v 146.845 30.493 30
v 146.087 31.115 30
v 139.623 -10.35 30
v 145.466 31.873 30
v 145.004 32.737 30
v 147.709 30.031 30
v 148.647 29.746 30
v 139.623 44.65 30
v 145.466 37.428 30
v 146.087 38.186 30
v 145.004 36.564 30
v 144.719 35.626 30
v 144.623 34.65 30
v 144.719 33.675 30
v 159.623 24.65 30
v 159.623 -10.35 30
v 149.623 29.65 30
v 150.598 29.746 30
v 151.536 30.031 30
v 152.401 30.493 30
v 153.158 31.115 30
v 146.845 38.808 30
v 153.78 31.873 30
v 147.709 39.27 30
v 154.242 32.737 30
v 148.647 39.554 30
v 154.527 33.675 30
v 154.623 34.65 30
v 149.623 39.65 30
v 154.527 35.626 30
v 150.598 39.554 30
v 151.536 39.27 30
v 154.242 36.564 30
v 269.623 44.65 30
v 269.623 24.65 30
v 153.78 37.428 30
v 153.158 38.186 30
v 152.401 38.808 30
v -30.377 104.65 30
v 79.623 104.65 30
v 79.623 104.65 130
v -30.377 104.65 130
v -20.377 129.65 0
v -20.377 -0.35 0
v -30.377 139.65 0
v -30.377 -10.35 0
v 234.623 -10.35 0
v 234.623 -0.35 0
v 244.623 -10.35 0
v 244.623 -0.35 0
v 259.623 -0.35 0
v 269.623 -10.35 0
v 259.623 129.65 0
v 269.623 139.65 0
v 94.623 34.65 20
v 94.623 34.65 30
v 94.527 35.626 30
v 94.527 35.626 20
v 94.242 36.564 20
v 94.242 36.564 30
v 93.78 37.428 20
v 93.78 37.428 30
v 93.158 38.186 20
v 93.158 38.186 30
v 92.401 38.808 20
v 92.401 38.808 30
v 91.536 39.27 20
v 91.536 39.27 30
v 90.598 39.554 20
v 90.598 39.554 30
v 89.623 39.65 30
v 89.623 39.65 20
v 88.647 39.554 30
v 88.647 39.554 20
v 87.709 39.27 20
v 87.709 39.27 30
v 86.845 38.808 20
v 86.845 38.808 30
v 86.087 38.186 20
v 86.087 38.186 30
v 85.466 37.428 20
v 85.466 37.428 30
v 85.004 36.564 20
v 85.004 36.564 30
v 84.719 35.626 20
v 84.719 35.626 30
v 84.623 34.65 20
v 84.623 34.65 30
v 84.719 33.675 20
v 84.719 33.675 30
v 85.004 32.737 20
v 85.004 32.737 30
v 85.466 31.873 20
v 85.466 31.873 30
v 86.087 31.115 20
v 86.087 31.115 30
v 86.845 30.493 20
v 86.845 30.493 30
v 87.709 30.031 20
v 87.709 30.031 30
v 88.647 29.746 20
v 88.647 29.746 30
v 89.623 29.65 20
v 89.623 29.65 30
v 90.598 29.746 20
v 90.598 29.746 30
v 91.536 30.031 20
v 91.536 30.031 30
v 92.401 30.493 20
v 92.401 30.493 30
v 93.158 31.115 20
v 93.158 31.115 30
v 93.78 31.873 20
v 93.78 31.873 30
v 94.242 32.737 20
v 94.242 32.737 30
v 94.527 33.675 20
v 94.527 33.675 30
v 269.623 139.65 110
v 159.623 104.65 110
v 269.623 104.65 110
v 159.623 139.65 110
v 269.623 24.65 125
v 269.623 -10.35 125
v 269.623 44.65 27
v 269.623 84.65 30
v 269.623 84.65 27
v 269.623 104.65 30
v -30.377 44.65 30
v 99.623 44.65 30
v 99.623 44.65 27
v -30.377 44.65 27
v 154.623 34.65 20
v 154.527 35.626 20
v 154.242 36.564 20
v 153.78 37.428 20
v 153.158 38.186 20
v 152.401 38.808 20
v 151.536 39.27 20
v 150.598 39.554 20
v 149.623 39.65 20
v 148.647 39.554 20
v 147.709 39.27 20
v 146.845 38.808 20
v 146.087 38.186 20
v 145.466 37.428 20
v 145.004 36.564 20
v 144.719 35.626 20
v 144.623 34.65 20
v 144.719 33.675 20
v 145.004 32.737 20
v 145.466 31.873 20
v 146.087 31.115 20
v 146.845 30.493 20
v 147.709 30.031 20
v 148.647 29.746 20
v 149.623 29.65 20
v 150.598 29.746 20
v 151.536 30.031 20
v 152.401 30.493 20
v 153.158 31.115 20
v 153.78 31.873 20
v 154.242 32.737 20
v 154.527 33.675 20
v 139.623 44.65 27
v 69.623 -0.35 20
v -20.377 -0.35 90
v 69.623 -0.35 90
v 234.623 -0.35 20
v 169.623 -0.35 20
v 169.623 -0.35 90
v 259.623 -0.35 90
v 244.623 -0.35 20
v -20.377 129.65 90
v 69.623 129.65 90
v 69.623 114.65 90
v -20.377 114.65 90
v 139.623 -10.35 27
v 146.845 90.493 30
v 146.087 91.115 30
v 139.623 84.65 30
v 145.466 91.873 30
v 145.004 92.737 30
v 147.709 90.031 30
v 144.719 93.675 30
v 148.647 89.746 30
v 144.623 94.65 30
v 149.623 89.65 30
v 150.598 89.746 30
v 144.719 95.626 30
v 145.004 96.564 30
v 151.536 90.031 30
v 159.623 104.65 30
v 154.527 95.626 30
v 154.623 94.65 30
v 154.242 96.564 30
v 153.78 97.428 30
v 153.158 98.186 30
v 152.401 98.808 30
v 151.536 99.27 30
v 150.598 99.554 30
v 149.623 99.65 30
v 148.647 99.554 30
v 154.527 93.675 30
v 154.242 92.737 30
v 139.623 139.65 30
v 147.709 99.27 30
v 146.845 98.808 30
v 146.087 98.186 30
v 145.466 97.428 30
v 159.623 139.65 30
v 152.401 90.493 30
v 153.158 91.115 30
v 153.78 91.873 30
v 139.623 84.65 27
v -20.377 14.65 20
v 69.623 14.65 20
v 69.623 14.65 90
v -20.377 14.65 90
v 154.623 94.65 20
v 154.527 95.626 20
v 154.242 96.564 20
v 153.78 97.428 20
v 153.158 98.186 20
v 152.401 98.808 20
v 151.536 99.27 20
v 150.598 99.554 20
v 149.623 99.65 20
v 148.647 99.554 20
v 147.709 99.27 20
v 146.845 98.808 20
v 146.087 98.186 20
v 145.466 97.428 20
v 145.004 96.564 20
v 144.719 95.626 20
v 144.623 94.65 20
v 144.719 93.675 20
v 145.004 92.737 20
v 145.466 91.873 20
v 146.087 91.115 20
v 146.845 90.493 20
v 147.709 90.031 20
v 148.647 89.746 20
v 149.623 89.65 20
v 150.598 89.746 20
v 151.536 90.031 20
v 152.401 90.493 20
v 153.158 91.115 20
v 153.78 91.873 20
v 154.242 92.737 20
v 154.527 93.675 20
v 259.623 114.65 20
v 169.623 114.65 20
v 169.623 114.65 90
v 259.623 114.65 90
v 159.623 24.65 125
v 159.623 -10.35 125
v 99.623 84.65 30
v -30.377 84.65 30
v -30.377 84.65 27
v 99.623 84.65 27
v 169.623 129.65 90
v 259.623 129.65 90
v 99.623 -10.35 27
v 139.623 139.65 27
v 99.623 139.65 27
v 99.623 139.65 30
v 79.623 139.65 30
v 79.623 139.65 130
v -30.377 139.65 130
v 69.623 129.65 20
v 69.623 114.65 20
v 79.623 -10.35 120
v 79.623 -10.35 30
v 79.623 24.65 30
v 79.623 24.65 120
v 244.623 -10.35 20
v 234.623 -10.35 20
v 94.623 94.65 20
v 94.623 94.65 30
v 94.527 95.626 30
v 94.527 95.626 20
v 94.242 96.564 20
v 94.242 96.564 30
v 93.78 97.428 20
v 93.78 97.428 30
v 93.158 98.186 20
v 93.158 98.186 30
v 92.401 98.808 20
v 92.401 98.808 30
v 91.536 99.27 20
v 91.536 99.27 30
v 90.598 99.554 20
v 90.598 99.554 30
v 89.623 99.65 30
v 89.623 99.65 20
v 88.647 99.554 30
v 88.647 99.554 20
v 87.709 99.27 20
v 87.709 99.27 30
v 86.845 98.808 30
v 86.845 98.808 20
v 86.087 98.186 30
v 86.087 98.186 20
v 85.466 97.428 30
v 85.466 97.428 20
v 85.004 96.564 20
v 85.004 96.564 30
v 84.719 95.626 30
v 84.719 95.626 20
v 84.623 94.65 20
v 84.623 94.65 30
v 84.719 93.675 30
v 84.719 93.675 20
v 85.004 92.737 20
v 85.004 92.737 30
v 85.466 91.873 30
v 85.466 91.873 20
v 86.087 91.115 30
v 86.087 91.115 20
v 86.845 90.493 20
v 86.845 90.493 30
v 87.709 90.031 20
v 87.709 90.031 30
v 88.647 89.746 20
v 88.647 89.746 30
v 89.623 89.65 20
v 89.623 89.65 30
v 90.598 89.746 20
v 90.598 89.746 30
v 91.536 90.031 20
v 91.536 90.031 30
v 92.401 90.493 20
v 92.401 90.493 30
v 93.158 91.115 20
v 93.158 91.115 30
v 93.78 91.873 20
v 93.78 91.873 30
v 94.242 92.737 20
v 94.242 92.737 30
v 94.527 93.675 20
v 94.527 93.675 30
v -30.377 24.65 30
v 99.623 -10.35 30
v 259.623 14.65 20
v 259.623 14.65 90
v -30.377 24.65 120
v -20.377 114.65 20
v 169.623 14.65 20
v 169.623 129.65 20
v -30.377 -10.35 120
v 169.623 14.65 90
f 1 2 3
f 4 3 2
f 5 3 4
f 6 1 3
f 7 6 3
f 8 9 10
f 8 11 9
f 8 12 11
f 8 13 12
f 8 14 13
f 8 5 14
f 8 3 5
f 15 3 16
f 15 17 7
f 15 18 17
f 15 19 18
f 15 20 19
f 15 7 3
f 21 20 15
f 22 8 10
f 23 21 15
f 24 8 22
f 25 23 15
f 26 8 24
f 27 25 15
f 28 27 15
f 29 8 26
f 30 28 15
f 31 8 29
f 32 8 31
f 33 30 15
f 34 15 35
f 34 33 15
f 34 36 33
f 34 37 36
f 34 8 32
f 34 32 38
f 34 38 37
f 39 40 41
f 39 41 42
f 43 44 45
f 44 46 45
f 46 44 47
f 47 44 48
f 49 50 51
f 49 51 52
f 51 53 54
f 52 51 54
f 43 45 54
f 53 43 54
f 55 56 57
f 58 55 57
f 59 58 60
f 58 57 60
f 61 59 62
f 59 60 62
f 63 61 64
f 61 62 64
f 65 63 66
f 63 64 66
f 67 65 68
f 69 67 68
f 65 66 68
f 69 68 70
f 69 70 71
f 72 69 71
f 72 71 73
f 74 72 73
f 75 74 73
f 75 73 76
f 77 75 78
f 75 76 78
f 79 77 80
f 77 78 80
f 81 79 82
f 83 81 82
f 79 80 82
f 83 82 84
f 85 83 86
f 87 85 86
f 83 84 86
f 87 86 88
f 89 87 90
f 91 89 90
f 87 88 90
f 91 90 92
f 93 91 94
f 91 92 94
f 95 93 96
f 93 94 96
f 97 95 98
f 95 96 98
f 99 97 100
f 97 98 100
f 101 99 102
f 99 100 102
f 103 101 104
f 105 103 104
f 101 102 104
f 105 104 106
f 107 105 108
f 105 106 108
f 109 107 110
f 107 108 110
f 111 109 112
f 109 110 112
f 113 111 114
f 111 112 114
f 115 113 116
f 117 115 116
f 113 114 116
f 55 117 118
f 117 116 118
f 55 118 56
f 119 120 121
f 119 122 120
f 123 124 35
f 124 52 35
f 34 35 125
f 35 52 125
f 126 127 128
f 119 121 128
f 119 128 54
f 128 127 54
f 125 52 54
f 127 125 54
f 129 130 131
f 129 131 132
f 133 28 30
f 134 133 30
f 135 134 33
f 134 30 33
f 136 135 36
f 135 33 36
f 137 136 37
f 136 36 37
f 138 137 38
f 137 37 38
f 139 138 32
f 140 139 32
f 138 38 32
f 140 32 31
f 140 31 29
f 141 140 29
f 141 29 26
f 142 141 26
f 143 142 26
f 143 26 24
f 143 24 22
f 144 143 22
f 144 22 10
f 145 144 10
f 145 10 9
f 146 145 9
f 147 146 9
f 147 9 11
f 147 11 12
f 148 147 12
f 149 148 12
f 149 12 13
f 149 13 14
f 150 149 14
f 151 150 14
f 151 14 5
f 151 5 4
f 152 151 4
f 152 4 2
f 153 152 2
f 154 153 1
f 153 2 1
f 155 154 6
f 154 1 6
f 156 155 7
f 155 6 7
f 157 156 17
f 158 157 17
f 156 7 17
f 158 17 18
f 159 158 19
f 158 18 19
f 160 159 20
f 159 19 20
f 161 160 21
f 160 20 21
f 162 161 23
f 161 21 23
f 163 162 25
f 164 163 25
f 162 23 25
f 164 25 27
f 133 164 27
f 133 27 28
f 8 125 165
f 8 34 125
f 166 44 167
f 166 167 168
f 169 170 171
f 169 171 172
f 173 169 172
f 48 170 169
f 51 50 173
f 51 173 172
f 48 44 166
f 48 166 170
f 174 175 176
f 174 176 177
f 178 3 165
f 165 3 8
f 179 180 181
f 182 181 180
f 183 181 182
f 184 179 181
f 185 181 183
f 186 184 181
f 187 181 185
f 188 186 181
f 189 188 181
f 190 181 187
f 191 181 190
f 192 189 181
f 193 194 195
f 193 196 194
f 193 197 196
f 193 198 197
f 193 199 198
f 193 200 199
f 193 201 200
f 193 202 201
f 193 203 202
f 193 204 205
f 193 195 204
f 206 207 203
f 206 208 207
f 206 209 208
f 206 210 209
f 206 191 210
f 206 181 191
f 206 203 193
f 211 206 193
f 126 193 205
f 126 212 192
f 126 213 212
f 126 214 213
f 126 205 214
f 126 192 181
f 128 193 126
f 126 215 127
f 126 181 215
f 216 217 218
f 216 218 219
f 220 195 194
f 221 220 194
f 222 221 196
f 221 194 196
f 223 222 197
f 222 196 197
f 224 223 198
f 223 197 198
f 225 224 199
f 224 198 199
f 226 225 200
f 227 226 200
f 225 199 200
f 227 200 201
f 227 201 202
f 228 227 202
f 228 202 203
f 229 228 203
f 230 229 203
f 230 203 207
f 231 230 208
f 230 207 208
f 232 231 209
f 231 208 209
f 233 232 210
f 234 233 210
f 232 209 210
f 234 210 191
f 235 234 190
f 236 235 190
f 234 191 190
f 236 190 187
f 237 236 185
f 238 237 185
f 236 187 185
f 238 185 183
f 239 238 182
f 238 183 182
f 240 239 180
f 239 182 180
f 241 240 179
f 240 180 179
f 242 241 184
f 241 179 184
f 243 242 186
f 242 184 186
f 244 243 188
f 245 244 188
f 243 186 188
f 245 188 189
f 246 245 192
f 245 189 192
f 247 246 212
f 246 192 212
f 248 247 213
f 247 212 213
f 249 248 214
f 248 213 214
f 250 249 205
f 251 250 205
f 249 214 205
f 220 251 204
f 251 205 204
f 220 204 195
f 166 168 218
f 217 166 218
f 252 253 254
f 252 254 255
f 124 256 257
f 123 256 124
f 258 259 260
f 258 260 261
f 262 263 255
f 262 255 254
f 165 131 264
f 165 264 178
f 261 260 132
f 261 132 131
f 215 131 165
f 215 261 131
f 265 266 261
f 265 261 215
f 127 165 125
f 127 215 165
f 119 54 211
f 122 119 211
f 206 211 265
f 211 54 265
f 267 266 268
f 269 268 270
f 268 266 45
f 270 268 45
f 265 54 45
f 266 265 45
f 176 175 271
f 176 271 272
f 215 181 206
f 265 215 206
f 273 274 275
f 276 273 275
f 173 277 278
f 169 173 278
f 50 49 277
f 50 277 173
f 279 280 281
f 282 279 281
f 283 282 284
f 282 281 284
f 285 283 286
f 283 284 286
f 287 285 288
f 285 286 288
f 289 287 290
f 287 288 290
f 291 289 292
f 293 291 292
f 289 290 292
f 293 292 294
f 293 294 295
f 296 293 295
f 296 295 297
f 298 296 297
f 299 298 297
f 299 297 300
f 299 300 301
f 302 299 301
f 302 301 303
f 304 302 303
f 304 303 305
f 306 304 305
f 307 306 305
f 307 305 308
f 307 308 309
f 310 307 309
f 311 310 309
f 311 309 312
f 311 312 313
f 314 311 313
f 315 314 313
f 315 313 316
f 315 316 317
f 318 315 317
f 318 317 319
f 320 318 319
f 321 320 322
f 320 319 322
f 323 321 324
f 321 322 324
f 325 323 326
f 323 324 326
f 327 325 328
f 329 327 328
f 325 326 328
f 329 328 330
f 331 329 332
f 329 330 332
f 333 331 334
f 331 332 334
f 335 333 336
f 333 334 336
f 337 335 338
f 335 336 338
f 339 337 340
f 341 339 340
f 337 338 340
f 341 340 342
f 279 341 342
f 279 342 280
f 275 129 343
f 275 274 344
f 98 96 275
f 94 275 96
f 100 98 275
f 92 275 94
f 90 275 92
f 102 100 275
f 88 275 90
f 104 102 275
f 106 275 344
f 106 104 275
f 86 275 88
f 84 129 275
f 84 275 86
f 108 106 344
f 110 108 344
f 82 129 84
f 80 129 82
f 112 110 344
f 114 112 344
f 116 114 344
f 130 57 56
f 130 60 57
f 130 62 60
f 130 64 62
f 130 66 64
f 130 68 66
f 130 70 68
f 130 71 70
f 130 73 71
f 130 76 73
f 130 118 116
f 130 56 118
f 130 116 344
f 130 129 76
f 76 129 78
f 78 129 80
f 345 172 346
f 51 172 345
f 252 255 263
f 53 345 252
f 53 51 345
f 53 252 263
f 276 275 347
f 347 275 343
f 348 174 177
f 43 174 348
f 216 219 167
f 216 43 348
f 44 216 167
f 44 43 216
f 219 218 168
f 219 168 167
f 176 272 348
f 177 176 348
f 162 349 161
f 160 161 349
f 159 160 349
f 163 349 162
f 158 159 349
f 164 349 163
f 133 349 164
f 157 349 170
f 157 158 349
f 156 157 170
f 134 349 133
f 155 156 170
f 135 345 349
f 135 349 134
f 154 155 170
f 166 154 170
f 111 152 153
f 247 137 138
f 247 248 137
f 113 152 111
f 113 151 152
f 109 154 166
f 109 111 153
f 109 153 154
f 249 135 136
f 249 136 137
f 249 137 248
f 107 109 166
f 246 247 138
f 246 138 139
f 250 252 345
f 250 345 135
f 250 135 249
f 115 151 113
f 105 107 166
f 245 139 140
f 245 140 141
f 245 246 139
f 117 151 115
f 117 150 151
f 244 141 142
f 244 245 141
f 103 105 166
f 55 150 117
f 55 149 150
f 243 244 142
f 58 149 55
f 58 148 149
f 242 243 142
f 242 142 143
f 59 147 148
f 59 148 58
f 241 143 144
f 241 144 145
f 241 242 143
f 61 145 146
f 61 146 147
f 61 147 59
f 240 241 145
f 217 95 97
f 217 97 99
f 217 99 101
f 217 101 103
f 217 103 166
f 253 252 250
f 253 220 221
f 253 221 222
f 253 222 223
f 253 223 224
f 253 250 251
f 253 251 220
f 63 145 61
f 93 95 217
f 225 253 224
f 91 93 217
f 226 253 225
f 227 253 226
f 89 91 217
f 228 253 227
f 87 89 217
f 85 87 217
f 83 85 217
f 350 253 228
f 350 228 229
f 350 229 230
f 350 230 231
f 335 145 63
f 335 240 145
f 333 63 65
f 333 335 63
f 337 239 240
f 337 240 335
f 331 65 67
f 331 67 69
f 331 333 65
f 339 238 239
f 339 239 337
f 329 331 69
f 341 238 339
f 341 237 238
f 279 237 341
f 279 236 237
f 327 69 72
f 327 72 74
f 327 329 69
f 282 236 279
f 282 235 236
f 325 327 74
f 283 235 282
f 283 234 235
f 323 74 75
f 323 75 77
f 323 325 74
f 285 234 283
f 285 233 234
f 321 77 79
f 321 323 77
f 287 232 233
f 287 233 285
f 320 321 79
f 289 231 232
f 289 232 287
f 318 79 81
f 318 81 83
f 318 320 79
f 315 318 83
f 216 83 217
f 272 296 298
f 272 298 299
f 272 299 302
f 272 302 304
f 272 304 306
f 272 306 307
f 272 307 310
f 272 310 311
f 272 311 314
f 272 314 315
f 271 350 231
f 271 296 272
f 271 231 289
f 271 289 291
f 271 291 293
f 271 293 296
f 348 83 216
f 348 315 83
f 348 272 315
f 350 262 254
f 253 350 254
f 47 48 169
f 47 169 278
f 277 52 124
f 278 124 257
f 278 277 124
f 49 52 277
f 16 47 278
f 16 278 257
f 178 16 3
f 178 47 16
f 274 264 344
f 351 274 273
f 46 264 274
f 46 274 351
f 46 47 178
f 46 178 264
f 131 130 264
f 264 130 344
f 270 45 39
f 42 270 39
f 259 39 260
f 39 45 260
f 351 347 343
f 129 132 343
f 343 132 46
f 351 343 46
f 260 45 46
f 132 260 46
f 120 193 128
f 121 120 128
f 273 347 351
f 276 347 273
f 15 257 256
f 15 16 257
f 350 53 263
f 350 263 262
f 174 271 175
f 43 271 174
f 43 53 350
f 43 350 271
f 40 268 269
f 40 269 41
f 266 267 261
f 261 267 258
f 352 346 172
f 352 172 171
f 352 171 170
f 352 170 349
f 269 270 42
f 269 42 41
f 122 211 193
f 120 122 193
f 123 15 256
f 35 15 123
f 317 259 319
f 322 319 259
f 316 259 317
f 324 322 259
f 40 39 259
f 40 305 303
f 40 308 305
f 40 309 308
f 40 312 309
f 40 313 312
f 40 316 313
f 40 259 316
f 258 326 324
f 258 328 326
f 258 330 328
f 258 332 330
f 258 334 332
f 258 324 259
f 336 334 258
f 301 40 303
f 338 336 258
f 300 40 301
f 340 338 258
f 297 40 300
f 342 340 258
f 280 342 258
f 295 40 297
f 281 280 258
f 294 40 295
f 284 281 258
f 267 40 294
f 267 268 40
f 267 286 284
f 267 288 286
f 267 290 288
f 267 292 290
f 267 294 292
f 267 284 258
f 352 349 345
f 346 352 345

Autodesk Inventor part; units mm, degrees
ref_plane "YZ Plane" through (0, 0, 0) normal (1, 0, 0) x (0, 1, 0)
ref_plane "XZ Plane" through (0, 0, 0) normal (0, 1, 0) x (-1, 0, 0)
ref_plane "XY Plane" through (0, 0, 0) normal (0, 0, 1) x (1, 0, 0)
sketch "Skizze2" plane through (0, 0, 0) normal (0, 0, 1) x (1, 0, 0)
  line L0 (-30.3771, 139.6504) -> (269.6229, 139.6504)
  line L1 (269.6229, 139.6504) -> (269.6229, -10.3496)
  line L2 (269.6229, -10.3496) -> (-30.3771, -10.3496)
  line L3 (-30.3771, -10.3496) -> (-30.3771, 139.6504)
  point P0 (0, 0)
  dimension "d4" = 300
  dimension "d5" = 150
extrude "Extrusion2" add sketch "Skizze2" along normal blind 30
sketch "Skizze3" plane through (0, 0, 30) normal (0, 0, 1) x (1, 0, 0)
  line L0 (-30.3771, 139.6504) -> (-30.3771, -10.3496) projected
  line L1 (269.6229, -10.3496) -> (269.6229, 139.6504) projected
  line L2 (-30.3771, 84.6504) -> (269.6229, 84.6504)
  line L3 (269.6229, 84.6504) -> (269.6229, 44.6504)
  line L4 (269.6229, 44.6504) -> (-30.3771, 44.6504)
  line L5 (-30.3771, 44.6504) -> (-30.3771, 84.6504)
  line L6 (269.6229, 139.6504) -> (-30.3771, 139.6504) projected
  point P0 (0, 0)
  dimension "d8" = 40
  dimension "d9" = 55
extrude "Extrusion3" cut sketch "Skizze3" against normal blind 3 contours L2 L1 L4 L0
sketch "Skizze5" plane through (0, 0, 30) normal (0, 0, 1) x (1, 0, 0)
  line L0 (-30.3771, -10.3496) -> (269.6229, -10.3496) projected
  line L1 (269.6229, 139.6504) -> (-30.3771, 139.6504) projected
  line L2 (99.6229, -10.3496) -> (139.6229, -10.3496)
  line L3 (139.6229, -10.3496) -> (139.6229, 139.6504)
  line L4 (139.6229, 139.6504) -> (99.6229, 139.6504)
  line L5 (99.6229, 139.6504) -> (99.6229, -10.3496)
  line L6 (-30.3771, 139.6504) -> (-30.3771, 84.6504) projected
  point P0 (0, 0)
  dimension "d15" = 40
  dimension "d16" = 130
extrude "Extrusion4" cut sketch "Skizze5" against normal blind 3
sketch "Skizze6" plane through (0, 0, 30) normal (0, 0, 1) x (1, 0, 0)
  line L0 (-30.3771, 139.6504) -> (-30.3771, -10.3496) projected
  line L1 (-30.3771, 139.6504) -> (79.6229, 139.6504)
  line L2 (79.6229, 139.6504) -> (79.6229, 104.6504)
  line L3 (79.6229, 104.6504) -> (-30.3771, 104.6504)
  line L4 (-30.3771, 104.6504) -> (-30.3771, 139.6504)
  line L5 (269.6229, 139.6504) -> (139.6229, 139.6504) projected
  line L6 (269.6229, 139.6504) -> (159.6229, 139.6504)
  line L7 (159.6229, 139.6504) -> (159.6229, 104.6504)
  line L8 (159.6229, 104.6504) -> (269.6229, 104.6504)
  line L9 (269.6229, 104.6504) -> (269.6229, 139.6504)
  line L10 (269.6229, -10.3496) -> (269.6229, 44.6504) projected
  line L11 (269.6229, -10.3496) -> (159.6229, -10.3496)
  line L12 (159.6229, -10.3496) -> (159.6229, 24.6504)
  line L13 (159.6229, 24.6504) -> (269.6229, 24.6504)
  line L14 (269.6229, 24.6504) -> (269.6229, -10.3496)
  line L15 (-30.3771, -10.3496) -> (79.6229, -10.3496)
  line L16 (79.6229, -10.3496) -> (79.6229, 24.6504)
  line L17 (79.6229, 24.6504) -> (-30.3771, 24.6504)
  line L18 (-30.3771, 24.6504) -> (-30.3771, -10.3496)
  point P0 (0, 0)
  dimension "d19" = 110
  dimension "d20" = 35
  dimension "d21" = 110
  dimension "d22" = 35
  dimension "d23" = 110
  dimension "d24" = 35
  dimension "d25" = 110
  dimension "d26" = 35
extrude "Extrusion5" add sketch "Skizze6" along normal blind 100 contours L1 L2 L3 L0
sketch "Skizze7" plane through (0, 0, 0) normal (0, 0, -1) x (-1, 0, 0)
  line L0 (20.3771, -0.3496) -> (-259.6229, -0.3496)
  line L1 (-259.6229, -0.3496) -> (-259.6229, 129.6504)
  line L2 (-259.6229, 129.6504) -> (20.3771, 129.6504)
  line L3 (20.3771, 129.6504) -> (20.3771, -0.3496)
  line L4 (30.3771, -10.3496) -> (-269.6229, -10.3496) projected
  line L5 (30.3771, 139.6504) -> (30.3771, -10.3496) projected
  line L6 (-234.6229, -10.3496) -> (-244.6229, -10.3496)
  line L7 (-244.6229, -10.3496) -> (-244.6229, -0.3496)
  line L8 (-244.6229, -0.3496) -> (-234.6229, -0.3496)
  line L9 (-234.6229, -0.3496) -> (-234.6229, -10.3496)
  line L10 (-269.6229, -10.3496) -> (-269.6229, 139.6504) projected
  point P0 (0, 0)
  point P1 (-239.6229, -10.3496)
  point P2 (-244.6229, -5.3496)
  dimension "d29" = 280
  dimension "d30" = 130
  dimension "d31" = 10
  dimension "d32" = 10
  dimension "d33" = 10
  dimension "d34" = 10
  dimension "d36" = 0
  dimension "d37" = 25
extrude "Extrusion6" cut sketch "Skizze7" against normal blind 20
sketch "Skizze8" plane through (0, 0, 30) normal (0, 0, 1) x (1, 0, 0)
  circle A0 centre (89.6229, 94.6504) radius 5
  line L0 (-30.3771, 84.6504) -> (99.6229, 84.6504) projected
  line L1 (99.6229, 84.6504) -> (99.6229, 139.6504) projected
  circle A1 centre (89.6229, 34.6504) radius 5
  line L2 (99.6229, 44.6504) -> (-30.3771, 44.6504) projected
  line L3 (99.6229, -10.3496) -> (99.6229, 44.6504) projected
  circle A2 centre (149.6229, 34.6504) radius 5
  line L4 (139.6229, 44.6504) -> (139.6229, -10.3496) projected
  circle A3 centre (149.6229, 94.6504) radius 5
  line L5 (139.6229, 139.6504) -> (139.6229, 84.6504) projected
  point P0 (0, 0)
  dimension "d40" = 10
  dimension "d41" = 10
  dimension "d42" = 10
  dimension "d43" = 10
  dimension "d44" = 10
  dimension "d45" = 10
  dimension "d46" = 10
  dimension "d47" = 10
  dimension "d48" = 10
  dimension "d49" = 10
extrude "Extrusion7" cut sketch "Skizze8" against normal through all
extrude "Extrusion8" add sketch "Skizze6" along normal blind 80 contours L9 L8 L7 L5
extrude "Extrusion9" add sketch "Skizze6" along normal blind 90 contours L17 L16 L15 L0
extrude "Extrusion10" add sketch "Skizze6" along normal blind 95 contours L11 L12 L13 L10
sketch "Skizze12" plane through (0, 0, 20) normal (0, 0, -1) x (-1, 0, 0)
  line L0 (-259.6229, 129.6504) -> (20.3771, 129.6504) projected
  line L1 (20.3771, 129.6504) -> (-69.6229, 129.6504)
  line L2 (-69.6229, 129.6504) -> (-69.6229, 114.6504)
  line L3 (-69.6229, 114.6504) -> (20.3771, 114.6504)
  line L4 (20.3771, 114.6504) -> (20.3771, 129.6504)
  line L5 (20.3771, -0.3496) -> (-234.6229, -0.3496) projected
  line L6 (20.3771, -0.3496) -> (-69.6229, -0.3496)
  line L7 (-69.6229, -0.3496) -> (-69.6229, 14.6504)
  line L8 (-69.6229, 14.6504) -> (20.3771, 14.6504)
  line L9 (20.3771, 14.6504) -> (20.3771, -0.3496)
  line L10 (-259.6229, 129.6504) -> (-169.6229, 129.6504)
  line L11 (-169.6229, 129.6504) -> (-169.6229, 114.6504)
  line L12 (-169.6229, 114.6504) -> (-259.6229, 114.6504)
  line L13 (-259.6229, 114.6504) -> (-259.6229, 129.6504)
  line L14 (-259.6229, -0.3496) -> (-169.6229, -0.3496)
  line L15 (-169.6229, -0.3496) -> (-169.6229, 14.6504)
  line L16 (-169.6229, 14.6504) -> (-259.6229, 14.6504)
  line L17 (-259.6229, 14.6504) -> (-259.6229, -0.3496)
  point P0 (0, 0)
  dimension "d58" = 90
  dimension "d59" = 15
  dimension "d60" = 90
  dimension "d61" = 15
  dimension "d62" = 90
  dimension "d63" = 15
  dimension "d64" = 90
  dimension "d65" = 15
extrude "Extrusion11" cut sketch "Skizze12" against normal blind 70
